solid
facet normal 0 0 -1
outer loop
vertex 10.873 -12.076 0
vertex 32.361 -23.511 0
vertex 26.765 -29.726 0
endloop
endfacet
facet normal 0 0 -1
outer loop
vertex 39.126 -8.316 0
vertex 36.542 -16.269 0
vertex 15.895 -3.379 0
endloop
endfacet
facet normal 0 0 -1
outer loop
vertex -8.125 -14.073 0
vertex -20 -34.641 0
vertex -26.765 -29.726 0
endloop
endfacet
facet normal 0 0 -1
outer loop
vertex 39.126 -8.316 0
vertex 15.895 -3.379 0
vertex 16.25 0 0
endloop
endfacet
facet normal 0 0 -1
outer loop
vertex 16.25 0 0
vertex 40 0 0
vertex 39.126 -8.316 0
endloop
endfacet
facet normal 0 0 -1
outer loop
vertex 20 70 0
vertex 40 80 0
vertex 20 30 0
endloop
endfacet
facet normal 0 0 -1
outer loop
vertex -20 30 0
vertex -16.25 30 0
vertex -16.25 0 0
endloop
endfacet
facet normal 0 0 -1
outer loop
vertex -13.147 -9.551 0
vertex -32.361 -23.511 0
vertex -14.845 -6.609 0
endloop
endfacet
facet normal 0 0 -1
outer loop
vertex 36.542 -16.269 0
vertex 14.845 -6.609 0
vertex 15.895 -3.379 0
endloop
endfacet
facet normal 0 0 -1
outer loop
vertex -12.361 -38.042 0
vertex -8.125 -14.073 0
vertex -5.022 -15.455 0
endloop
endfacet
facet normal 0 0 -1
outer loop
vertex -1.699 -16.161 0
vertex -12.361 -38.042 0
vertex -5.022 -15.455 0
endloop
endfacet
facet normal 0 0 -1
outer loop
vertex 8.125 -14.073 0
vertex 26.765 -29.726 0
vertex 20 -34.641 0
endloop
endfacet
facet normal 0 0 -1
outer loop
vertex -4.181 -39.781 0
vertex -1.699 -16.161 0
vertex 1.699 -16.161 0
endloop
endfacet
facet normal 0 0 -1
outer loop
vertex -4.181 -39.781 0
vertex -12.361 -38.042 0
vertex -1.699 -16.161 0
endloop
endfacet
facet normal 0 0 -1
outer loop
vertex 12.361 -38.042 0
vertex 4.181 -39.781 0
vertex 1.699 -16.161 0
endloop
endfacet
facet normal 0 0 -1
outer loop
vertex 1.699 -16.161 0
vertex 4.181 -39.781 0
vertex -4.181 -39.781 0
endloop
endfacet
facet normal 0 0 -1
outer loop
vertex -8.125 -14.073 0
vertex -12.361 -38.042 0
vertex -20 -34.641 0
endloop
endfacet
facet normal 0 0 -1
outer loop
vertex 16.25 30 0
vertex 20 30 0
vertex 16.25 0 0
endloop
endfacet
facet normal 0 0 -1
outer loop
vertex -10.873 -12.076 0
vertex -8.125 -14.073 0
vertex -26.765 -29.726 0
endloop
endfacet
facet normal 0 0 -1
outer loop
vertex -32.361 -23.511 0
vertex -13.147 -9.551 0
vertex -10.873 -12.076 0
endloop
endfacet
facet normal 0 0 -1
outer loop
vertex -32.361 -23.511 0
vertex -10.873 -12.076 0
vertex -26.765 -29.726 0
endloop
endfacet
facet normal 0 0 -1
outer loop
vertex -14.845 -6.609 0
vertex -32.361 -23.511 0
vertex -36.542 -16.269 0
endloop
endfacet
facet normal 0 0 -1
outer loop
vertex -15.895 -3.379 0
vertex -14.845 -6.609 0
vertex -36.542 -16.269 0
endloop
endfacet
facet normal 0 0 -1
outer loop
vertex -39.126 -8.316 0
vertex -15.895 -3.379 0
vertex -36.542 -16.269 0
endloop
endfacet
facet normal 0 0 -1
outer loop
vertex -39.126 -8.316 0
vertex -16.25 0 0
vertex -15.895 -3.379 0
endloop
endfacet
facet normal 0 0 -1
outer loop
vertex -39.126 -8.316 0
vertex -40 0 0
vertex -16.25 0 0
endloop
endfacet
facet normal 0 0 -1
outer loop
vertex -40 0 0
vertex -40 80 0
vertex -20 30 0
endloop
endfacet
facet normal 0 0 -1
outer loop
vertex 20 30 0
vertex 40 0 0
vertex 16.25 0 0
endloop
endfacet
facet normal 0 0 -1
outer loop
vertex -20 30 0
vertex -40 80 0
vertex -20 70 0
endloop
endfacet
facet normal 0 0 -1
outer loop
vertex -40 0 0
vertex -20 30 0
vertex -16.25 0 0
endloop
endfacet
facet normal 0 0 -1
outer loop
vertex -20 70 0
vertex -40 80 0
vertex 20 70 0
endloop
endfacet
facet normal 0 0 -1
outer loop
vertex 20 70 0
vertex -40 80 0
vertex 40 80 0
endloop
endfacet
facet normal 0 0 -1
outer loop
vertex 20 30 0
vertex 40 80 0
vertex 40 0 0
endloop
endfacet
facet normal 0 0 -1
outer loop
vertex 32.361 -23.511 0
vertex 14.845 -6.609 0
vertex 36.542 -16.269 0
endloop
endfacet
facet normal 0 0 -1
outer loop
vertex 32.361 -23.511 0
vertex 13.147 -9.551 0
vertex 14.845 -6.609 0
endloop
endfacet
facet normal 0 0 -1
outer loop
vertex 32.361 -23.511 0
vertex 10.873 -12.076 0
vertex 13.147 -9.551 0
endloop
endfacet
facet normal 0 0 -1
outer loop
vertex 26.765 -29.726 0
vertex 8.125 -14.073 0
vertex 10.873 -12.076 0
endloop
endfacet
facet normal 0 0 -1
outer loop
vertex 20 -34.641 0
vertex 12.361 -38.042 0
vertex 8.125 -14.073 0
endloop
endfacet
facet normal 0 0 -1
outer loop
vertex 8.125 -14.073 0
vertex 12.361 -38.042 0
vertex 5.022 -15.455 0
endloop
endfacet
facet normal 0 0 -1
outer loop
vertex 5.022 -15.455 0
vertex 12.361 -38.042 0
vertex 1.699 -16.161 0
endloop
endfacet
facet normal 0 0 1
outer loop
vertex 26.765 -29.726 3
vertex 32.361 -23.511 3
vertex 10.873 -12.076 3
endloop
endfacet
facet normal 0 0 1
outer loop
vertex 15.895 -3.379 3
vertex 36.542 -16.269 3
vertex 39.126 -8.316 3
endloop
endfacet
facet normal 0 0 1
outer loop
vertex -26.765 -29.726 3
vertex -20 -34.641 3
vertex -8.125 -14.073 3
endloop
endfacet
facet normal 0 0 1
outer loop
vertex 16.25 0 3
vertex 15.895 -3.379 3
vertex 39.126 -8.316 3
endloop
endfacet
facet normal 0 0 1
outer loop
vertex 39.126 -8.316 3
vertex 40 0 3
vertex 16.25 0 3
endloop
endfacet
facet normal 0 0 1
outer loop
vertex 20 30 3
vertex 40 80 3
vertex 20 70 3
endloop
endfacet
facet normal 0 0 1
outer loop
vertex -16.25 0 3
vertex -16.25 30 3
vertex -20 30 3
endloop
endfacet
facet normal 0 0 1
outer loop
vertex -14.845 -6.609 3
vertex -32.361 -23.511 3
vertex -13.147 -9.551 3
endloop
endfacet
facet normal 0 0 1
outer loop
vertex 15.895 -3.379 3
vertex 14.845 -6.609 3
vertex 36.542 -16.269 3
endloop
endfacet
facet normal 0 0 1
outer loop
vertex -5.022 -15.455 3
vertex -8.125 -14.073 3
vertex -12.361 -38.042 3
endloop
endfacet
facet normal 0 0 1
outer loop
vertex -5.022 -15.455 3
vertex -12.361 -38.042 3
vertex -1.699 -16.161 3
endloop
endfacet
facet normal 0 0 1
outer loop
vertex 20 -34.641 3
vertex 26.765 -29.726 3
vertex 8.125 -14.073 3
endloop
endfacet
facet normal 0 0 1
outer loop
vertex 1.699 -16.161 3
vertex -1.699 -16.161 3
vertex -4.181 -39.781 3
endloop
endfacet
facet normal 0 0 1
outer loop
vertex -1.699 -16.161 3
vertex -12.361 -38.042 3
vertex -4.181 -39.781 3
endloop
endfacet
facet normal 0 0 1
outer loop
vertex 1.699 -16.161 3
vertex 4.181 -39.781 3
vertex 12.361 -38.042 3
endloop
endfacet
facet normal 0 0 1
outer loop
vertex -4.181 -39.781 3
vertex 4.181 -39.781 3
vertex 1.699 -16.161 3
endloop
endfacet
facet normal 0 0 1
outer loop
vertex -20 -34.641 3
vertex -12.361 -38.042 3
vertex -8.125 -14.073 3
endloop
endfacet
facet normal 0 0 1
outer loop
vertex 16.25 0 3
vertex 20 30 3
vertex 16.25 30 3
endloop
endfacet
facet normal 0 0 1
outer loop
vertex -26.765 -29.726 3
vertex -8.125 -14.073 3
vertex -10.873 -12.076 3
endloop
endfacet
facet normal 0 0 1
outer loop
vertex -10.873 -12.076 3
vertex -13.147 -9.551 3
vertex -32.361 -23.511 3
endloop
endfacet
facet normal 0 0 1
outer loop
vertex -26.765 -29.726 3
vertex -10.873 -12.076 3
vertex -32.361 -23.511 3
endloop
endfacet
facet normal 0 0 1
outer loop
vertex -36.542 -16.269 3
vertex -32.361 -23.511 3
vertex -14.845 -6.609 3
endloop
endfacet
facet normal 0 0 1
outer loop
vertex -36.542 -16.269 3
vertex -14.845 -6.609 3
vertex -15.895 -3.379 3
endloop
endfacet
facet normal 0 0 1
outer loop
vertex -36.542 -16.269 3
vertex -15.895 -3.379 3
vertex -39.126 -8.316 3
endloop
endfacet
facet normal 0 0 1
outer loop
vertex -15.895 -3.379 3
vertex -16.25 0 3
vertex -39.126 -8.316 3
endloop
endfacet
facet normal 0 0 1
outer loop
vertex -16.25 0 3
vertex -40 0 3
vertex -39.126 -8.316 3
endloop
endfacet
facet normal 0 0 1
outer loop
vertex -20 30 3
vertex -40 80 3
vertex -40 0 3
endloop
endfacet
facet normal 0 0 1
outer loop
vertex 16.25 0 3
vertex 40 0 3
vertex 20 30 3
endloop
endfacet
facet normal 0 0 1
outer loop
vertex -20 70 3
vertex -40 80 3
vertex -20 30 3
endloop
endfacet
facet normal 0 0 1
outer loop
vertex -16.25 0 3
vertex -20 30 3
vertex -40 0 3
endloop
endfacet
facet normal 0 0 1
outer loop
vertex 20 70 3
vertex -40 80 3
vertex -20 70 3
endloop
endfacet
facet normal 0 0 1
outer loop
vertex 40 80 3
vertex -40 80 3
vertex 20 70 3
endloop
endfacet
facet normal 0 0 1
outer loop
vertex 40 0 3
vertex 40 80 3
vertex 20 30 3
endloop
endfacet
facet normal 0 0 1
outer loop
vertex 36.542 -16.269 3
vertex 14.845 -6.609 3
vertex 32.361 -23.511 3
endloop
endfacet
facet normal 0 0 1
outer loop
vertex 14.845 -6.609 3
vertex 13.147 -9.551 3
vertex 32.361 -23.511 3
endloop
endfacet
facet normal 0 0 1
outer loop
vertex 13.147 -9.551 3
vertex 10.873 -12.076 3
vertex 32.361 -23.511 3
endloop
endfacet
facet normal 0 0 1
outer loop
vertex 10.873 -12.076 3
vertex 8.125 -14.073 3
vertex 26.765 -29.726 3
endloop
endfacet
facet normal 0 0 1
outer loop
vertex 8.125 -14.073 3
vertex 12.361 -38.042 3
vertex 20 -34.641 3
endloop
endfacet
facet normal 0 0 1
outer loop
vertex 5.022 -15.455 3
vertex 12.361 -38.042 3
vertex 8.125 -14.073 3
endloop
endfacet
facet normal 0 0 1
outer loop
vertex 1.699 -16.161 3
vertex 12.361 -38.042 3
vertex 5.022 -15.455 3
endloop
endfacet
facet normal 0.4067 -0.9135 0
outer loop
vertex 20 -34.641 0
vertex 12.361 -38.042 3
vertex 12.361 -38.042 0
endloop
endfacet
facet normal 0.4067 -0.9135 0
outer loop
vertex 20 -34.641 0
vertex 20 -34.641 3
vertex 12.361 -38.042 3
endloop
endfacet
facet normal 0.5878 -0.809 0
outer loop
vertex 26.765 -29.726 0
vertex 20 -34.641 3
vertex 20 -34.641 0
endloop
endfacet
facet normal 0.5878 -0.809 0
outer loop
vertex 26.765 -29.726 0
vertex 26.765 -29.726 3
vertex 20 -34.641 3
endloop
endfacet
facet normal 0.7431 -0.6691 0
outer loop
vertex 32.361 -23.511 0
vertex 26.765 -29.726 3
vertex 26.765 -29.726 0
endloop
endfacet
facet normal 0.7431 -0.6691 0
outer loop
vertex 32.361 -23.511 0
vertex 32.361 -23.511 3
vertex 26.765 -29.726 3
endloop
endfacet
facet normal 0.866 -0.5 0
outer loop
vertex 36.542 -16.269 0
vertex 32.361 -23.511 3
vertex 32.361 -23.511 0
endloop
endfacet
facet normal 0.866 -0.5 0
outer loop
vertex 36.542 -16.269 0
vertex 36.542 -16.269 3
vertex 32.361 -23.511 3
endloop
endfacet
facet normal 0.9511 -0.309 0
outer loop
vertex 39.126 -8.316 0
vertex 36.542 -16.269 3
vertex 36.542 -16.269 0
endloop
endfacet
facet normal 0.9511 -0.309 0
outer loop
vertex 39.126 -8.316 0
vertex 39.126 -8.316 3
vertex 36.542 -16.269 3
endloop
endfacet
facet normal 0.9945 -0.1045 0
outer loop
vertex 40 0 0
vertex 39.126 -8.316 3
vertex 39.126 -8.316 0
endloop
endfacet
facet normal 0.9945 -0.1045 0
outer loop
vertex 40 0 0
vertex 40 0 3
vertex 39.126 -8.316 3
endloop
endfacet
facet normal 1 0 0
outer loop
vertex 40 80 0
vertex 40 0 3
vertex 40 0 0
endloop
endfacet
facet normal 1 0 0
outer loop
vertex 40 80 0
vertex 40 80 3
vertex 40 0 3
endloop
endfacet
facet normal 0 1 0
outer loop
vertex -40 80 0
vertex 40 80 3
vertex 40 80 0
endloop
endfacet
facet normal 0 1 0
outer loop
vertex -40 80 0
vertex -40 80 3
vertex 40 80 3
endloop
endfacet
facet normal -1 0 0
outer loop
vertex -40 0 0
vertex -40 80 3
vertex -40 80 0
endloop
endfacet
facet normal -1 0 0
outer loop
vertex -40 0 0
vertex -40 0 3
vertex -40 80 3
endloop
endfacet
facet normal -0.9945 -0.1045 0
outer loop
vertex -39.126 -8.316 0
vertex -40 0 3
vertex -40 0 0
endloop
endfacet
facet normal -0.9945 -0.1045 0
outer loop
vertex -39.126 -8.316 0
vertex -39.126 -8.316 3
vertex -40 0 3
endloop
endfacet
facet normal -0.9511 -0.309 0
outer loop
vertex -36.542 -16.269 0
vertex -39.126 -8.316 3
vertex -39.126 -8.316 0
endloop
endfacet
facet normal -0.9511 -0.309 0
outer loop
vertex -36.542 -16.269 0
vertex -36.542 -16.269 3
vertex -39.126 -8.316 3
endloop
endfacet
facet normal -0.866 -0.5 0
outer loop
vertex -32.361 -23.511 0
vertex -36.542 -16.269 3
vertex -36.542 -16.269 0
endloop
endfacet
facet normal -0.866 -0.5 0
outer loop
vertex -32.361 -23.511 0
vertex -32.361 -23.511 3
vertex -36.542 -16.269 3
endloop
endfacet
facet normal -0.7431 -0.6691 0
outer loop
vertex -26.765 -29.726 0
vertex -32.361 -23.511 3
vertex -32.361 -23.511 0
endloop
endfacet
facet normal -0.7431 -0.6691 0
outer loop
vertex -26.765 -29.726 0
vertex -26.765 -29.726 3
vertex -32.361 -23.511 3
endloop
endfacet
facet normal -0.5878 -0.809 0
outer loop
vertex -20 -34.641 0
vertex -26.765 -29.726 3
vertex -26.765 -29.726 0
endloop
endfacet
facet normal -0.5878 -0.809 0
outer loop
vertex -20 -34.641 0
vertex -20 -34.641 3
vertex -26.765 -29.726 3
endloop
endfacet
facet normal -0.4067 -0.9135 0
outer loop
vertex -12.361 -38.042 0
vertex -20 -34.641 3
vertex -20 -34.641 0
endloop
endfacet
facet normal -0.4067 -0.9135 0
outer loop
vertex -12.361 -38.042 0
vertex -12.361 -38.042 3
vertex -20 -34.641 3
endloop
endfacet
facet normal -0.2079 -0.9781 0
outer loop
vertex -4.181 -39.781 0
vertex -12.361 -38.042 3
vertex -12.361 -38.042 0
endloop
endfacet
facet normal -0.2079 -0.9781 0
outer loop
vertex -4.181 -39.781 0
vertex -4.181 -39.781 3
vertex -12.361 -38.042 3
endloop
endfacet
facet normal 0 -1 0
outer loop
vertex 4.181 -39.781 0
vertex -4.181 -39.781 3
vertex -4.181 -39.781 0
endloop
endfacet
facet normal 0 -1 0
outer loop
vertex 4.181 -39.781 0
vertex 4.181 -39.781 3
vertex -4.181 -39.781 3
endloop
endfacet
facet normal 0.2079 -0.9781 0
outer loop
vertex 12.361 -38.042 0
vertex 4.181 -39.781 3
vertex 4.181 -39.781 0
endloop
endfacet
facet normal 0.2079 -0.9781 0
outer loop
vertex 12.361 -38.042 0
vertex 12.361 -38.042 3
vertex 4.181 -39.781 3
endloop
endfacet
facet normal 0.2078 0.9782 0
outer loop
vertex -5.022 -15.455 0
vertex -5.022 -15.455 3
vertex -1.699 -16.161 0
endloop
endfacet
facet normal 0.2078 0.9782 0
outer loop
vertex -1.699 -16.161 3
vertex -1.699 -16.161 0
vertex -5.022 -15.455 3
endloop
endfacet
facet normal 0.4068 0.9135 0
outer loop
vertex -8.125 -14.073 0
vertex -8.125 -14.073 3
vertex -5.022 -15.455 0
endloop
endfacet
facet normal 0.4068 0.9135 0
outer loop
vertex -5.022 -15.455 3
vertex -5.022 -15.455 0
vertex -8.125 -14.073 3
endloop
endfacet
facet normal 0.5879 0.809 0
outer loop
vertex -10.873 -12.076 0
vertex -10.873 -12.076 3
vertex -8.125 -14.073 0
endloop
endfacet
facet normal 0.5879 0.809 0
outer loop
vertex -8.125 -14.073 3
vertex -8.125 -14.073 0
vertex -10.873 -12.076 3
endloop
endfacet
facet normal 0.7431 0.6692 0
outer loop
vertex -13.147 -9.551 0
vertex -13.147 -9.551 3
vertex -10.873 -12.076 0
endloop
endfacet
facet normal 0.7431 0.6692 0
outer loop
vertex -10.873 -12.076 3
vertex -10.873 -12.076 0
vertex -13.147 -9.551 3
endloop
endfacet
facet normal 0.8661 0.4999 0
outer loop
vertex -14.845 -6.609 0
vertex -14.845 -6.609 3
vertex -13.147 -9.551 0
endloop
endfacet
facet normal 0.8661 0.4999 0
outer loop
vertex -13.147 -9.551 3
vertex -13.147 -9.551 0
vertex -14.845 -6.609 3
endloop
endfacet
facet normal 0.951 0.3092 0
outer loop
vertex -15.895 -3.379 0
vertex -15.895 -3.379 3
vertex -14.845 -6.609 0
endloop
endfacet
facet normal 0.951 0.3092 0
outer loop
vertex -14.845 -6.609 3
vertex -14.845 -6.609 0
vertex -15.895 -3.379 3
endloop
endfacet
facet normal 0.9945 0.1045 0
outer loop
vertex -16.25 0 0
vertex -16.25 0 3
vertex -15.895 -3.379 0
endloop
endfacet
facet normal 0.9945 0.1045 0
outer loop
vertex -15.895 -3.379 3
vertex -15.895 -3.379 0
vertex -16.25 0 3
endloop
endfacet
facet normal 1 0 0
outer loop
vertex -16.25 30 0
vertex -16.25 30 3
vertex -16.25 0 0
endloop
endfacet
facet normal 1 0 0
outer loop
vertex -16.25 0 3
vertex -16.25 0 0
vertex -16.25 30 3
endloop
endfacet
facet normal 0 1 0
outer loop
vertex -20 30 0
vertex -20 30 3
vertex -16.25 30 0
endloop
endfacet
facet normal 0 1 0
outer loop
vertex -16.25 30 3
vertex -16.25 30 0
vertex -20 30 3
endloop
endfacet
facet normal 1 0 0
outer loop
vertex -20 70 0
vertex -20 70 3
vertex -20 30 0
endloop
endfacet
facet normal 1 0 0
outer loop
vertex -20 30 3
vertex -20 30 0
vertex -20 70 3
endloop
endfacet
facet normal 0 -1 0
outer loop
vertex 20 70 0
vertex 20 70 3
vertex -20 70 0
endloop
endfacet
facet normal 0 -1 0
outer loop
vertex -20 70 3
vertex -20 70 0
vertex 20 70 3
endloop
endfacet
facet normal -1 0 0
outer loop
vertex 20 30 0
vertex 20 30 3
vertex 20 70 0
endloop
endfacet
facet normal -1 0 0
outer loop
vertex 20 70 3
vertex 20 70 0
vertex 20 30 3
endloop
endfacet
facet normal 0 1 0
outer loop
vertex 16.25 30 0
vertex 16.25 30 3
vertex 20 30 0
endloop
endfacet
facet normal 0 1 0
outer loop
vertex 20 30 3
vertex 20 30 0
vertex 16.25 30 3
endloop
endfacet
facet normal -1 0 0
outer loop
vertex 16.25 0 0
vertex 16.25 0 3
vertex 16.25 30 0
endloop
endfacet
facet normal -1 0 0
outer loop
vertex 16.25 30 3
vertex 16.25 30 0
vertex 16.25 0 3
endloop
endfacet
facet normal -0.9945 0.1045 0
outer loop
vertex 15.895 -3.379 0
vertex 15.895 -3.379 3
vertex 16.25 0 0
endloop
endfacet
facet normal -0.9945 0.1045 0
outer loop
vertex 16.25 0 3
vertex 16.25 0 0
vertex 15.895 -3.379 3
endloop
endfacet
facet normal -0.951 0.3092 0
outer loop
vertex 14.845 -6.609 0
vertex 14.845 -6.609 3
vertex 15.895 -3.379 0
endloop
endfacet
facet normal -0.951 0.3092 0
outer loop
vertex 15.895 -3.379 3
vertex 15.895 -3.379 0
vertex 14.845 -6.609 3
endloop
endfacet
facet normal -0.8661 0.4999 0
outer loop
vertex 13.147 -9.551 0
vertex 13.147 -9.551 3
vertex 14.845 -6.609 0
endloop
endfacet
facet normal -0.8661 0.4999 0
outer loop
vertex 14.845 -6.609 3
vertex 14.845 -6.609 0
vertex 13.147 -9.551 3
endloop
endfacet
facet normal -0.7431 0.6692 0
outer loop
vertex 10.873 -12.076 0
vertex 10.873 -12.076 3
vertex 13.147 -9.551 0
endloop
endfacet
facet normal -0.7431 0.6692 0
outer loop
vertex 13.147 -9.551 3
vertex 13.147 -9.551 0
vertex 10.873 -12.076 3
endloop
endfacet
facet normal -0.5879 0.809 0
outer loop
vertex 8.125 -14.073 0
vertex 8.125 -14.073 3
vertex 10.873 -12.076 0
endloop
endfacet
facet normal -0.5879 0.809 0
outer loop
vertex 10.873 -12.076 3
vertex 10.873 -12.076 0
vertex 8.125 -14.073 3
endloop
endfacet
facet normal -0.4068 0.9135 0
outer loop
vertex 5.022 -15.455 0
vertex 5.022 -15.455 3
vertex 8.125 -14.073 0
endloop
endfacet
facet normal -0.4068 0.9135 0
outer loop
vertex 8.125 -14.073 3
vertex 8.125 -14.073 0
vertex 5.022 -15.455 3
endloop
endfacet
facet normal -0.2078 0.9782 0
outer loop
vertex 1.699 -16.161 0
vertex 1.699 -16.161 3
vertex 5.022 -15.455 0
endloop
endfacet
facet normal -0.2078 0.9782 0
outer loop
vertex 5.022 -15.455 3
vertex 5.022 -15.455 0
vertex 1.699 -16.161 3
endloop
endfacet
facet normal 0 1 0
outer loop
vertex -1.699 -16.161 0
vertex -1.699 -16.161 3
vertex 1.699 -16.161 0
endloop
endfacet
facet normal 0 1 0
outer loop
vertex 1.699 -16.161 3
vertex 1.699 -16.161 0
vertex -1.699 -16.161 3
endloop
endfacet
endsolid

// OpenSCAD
linear_extrude(3) {
    difference() {

        union() {
            circle(40);
            translate([-40,0,0]) { square(80,80); }
        }
        
        circle(16.25);
        translate([-16.25,0,0]) { square(32.5,80); } 
        translate([-20,30,0]) { square(40,80); } 
    }
}
